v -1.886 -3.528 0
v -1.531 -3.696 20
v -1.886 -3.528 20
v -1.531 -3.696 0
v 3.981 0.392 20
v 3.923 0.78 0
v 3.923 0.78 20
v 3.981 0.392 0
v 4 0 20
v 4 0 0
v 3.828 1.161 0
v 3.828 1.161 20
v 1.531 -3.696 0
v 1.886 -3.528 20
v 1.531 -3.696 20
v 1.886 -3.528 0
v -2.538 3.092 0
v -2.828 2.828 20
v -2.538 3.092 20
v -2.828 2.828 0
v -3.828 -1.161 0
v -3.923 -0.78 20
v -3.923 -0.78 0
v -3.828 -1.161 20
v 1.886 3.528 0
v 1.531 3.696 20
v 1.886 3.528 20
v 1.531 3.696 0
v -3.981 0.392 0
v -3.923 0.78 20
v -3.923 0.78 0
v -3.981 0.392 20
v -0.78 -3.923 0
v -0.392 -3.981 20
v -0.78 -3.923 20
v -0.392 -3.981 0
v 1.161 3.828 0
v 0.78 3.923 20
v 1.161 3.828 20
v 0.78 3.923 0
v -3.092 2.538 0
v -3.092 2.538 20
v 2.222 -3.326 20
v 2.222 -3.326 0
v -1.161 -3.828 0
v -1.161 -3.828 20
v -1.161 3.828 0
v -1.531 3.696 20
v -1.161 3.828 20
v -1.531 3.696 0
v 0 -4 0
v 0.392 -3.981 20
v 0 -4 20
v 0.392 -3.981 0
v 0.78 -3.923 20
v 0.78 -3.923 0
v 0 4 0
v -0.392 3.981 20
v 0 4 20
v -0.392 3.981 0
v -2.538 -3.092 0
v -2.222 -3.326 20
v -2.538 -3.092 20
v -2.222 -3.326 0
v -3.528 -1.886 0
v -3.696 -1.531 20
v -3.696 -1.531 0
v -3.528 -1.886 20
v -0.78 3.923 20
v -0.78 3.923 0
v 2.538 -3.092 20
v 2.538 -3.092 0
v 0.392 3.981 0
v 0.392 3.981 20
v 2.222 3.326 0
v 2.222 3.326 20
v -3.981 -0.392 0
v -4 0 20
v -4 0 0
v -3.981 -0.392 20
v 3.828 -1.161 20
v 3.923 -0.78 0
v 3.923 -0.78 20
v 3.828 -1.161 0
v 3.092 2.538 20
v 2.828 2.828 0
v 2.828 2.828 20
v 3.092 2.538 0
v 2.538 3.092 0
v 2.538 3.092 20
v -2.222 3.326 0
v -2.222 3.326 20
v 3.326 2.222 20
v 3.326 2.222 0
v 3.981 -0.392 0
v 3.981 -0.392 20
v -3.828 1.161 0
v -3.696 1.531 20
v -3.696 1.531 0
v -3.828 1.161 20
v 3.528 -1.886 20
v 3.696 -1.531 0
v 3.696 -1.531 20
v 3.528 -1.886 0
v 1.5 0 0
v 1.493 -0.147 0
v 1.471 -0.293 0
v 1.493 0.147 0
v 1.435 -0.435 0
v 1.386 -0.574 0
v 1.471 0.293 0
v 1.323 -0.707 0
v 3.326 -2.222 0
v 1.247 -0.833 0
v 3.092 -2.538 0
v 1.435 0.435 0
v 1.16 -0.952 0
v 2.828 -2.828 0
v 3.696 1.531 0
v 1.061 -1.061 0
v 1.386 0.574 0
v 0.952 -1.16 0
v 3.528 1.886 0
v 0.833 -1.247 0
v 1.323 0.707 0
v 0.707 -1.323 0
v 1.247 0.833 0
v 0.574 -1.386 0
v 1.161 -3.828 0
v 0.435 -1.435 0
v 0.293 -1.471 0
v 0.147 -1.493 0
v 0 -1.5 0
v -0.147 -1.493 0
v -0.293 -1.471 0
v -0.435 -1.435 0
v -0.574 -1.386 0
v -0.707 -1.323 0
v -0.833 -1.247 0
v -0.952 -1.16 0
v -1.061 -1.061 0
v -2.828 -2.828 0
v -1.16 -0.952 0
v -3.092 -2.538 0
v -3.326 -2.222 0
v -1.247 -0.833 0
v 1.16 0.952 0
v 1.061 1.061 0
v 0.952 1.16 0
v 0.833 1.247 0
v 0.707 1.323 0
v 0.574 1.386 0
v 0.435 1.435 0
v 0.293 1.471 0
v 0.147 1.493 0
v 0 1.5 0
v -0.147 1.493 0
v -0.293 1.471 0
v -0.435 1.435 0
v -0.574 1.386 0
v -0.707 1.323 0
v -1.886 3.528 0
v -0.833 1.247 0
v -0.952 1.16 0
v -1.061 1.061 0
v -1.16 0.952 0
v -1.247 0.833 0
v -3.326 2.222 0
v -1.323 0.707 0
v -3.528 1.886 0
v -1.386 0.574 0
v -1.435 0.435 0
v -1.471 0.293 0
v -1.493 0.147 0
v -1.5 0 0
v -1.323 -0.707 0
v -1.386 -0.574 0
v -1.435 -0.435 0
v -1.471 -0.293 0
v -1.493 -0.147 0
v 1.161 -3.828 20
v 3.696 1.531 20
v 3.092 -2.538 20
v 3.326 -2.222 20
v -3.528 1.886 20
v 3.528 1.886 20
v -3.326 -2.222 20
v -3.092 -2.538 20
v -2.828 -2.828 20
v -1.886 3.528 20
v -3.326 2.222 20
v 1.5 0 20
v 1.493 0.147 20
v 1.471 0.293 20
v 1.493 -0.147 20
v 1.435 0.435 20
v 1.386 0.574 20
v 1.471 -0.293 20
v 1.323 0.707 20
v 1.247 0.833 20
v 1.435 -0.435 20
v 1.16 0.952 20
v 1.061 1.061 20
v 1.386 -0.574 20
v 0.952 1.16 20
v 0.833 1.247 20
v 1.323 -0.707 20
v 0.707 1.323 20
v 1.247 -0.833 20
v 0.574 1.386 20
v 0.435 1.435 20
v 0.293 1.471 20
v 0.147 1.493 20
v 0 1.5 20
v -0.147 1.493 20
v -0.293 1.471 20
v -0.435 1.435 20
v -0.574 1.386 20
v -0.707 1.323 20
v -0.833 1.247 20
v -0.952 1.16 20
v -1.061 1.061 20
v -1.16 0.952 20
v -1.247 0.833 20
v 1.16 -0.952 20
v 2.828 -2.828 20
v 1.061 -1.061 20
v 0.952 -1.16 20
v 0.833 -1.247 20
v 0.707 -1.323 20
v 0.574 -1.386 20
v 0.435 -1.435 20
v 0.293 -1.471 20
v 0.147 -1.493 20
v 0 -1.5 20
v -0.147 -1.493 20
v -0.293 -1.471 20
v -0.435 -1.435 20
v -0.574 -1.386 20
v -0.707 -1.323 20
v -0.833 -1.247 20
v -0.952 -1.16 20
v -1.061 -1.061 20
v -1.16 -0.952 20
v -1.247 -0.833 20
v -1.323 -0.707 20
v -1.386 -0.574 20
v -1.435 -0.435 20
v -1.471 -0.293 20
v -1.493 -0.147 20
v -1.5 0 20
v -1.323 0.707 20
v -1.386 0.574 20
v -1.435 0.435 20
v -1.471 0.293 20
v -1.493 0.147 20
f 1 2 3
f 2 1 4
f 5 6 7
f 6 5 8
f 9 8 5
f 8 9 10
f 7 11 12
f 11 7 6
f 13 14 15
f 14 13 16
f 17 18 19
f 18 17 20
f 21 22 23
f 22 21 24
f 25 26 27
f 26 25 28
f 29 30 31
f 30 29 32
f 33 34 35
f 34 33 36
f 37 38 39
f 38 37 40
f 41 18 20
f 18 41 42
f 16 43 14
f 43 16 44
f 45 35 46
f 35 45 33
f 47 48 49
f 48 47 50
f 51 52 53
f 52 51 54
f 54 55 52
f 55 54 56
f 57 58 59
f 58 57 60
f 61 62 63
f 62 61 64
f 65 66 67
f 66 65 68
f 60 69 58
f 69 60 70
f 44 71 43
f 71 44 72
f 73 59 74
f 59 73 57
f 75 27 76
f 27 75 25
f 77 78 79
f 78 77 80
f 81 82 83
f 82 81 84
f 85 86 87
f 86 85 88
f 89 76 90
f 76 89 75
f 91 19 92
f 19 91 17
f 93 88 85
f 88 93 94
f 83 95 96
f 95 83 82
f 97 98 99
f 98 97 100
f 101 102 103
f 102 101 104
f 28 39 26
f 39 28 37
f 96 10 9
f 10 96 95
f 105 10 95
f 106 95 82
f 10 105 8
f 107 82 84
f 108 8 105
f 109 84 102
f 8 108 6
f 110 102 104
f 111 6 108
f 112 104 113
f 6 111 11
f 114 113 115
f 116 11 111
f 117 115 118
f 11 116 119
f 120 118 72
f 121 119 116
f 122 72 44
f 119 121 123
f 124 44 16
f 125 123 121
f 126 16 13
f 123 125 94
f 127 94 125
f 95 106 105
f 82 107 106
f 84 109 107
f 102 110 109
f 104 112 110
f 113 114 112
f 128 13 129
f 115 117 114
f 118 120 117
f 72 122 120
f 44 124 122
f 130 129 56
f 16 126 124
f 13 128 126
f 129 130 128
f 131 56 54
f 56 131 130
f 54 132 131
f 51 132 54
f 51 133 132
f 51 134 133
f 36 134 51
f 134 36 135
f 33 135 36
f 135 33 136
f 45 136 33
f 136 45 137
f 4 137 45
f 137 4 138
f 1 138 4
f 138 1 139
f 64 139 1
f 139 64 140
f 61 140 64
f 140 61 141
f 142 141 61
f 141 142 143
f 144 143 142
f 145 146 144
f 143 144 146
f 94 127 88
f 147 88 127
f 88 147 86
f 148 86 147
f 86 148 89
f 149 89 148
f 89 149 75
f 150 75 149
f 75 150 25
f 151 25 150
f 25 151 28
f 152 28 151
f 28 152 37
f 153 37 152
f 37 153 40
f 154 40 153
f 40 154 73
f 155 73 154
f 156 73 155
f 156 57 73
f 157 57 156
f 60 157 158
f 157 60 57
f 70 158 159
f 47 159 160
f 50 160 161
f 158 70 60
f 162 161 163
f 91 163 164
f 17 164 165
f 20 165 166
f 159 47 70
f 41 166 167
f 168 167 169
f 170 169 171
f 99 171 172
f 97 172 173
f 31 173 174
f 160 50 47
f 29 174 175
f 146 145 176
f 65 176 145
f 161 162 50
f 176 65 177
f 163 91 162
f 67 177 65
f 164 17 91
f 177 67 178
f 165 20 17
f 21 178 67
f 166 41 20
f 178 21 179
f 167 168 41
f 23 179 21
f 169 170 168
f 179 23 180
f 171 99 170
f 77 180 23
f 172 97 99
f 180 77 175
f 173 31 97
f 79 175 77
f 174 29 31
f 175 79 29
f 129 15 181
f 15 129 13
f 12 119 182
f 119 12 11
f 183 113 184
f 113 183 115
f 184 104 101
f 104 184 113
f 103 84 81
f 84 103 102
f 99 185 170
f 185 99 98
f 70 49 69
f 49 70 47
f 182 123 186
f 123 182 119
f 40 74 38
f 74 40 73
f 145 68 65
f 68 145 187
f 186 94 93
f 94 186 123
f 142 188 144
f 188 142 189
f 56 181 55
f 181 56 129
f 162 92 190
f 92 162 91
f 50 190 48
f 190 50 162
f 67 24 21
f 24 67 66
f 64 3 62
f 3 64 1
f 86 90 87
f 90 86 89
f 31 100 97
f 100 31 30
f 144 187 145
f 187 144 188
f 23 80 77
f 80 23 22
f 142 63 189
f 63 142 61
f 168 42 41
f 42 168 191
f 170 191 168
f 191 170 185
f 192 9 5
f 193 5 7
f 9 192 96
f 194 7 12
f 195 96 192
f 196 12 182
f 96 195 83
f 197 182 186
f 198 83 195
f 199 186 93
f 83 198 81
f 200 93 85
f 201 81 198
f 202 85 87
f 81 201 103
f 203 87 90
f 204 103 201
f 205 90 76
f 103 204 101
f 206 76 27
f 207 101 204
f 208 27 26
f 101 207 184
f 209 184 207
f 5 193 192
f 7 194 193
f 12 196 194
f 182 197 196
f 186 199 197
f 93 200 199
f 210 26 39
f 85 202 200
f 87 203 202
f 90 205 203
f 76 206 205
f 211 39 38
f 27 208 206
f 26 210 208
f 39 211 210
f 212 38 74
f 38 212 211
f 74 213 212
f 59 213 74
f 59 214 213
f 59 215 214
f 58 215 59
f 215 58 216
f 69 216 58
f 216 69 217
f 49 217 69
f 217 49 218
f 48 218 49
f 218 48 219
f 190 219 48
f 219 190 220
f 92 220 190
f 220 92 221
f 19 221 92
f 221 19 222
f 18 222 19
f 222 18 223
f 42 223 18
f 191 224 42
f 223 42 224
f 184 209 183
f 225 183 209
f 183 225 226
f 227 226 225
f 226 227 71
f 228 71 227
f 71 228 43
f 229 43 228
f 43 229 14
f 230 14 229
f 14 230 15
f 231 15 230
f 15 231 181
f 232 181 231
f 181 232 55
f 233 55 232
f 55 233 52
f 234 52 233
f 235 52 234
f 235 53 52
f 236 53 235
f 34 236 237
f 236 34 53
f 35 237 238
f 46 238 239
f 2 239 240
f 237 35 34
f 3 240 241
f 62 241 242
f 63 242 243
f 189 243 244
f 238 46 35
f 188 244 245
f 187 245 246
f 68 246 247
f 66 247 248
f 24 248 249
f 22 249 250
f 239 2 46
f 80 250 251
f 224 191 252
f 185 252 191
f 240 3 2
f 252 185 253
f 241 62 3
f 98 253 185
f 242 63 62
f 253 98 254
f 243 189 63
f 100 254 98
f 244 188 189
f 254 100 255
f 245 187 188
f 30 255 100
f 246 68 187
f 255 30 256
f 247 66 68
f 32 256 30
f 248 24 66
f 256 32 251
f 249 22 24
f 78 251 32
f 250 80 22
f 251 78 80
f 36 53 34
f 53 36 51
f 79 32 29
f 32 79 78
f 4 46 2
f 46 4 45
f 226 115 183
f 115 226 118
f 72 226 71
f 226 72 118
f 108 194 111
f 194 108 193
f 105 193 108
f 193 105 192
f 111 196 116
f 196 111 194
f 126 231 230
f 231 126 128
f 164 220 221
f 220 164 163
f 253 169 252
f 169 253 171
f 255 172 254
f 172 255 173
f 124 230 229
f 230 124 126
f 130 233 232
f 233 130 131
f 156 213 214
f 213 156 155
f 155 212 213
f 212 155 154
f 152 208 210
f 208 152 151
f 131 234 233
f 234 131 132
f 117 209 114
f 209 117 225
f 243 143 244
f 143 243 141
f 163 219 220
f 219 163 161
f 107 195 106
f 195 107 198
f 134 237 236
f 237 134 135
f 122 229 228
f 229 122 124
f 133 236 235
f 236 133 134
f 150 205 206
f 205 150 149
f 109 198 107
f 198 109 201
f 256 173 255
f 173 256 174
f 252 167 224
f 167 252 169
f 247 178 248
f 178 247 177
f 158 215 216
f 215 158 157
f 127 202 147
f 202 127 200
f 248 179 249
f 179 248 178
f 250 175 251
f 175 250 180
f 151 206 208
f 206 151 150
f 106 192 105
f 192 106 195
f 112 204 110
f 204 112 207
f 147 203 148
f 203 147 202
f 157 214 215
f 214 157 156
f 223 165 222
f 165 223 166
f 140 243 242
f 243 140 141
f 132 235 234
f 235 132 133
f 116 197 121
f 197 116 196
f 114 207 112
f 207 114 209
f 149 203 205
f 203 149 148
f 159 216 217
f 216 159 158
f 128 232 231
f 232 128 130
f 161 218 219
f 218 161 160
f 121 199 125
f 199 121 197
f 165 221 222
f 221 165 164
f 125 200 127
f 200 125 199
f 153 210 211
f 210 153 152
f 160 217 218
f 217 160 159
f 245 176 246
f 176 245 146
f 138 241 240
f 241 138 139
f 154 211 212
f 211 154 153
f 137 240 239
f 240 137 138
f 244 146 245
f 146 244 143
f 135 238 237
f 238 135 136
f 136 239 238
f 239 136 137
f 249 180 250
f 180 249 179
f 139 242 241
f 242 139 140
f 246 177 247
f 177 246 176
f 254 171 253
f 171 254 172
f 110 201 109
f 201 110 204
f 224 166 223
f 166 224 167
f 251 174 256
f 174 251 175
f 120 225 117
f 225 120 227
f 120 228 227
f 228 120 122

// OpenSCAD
module standoff_pillar() {
    difference() {
        cylinder(h = 20.0, d = 8.0, $fn = 64);
        translate([0, 0, -1])
            cylinder(h = 22.0, d = 3.0, $fn = 64);
    }
}

standoff_pillar();
